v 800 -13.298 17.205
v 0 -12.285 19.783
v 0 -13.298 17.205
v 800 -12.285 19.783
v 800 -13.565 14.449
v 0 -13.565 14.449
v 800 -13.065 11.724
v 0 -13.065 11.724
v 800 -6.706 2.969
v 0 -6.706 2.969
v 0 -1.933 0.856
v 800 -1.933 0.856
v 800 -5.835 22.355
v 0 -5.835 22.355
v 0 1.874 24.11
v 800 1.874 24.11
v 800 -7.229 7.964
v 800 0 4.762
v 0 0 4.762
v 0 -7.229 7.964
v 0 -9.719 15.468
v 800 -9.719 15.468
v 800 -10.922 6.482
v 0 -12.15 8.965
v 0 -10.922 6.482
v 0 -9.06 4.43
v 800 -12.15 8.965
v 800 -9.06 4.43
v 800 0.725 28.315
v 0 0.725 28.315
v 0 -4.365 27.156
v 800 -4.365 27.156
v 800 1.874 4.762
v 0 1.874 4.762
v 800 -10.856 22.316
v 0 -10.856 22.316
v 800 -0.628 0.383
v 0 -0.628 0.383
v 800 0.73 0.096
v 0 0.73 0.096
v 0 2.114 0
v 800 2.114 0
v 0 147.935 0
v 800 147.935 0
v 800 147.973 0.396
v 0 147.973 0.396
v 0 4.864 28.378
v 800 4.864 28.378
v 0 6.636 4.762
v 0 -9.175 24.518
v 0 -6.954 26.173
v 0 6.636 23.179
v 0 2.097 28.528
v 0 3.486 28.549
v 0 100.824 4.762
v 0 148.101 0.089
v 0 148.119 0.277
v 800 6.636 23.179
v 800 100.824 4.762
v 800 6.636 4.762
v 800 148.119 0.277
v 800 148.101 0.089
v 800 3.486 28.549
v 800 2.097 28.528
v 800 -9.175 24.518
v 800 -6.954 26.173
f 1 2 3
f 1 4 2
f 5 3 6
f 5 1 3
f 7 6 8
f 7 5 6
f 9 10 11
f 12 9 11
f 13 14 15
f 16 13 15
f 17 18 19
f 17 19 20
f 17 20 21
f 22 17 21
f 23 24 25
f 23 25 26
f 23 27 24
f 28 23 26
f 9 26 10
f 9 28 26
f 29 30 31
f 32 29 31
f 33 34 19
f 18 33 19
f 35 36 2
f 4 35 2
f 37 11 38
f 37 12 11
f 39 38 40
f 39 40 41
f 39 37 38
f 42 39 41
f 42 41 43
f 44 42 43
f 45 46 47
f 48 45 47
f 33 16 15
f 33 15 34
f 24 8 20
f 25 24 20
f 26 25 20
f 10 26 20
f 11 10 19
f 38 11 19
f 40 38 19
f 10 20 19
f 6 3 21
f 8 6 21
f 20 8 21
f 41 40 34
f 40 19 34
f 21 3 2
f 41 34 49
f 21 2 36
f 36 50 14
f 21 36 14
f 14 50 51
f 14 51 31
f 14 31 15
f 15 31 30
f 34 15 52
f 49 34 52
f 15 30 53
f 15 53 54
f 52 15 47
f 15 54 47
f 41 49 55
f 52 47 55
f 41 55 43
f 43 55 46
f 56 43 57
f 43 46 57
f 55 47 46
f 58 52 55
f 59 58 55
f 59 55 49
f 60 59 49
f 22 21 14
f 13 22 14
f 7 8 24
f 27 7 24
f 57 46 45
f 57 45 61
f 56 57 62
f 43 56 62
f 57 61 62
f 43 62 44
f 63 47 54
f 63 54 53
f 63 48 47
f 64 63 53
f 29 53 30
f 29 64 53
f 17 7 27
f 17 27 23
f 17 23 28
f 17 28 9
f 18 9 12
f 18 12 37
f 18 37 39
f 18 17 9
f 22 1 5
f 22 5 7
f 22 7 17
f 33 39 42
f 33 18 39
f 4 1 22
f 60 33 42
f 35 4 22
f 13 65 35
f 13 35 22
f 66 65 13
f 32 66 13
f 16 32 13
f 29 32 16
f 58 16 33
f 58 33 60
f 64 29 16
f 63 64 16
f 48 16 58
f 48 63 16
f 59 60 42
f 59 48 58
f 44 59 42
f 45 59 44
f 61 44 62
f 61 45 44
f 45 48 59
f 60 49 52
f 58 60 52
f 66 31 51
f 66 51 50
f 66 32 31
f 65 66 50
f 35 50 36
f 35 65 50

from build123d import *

# Parameters (mm, degrees)
F1_DEPTH = 800
F2_R     = 10
F3_R     = 0.2


with BuildPart() as f1:
    # F0 (on Right) → F1 (new body)
    with BuildSketch(Plane.YZ):
        Polygon((100.824344, 4.7625), (125.181556, 0), (150, 0), (2.787639, 28.784037), (1.873746, 24.110044), (6.636246, 23.178845), align=None)
        Polygon((0, 4.7625), (0, 0), (125.181556, 0), (100.824344, 4.7625), (6.636246, 4.7625), (1.873746, 4.7625), align=None)
        Polygon((1.873746, 24.110044), (1.873746, 4.7625), (6.636246, 4.7625), (6.636246, 23.178845), align=None)
        Polygon((1.873746, 24.110044), (2.787639, 28.784037), (-8.682065, 26.173362), (-5.835444, 22.355227), align=None)
        Polygon((-10.756327, 4.761424), (0, 0), (0, 4.7625), (-7.229277, 7.963836), align=None)
        Polygon((-14.458972, 15.926554), (-10.756327, 4.761424), (-7.229277, 7.963836), (-9.718587, 15.468123), align=None)
        Polygon((-8.682065, 26.173362), (-14.458972, 15.926554), (-9.718587, 15.468123), (-5.835444, 22.355227), align=None)
    extrude(amount=F1_DEPTH)

    # F2
    f2_edges = [f1.edges().sort_by_distance(p)[0] for p in [
        (400, -8.682065, 26.173362),
        (400, -14.458972, 15.926554),
        (400, 2.787639, 28.784037),
        (400, -10.756327, 4.761424),
        (400, 0, 0),
    ]]
    fillet(f2_edges, radius=F2_R)

    # F3
    f3_edges = [f1.edges().sort_by_distance(p)[0] for p in [
        (400, 150, 0),
    ]]
    fillet(f3_edges, radius=F3_R)


solid = f1.part
